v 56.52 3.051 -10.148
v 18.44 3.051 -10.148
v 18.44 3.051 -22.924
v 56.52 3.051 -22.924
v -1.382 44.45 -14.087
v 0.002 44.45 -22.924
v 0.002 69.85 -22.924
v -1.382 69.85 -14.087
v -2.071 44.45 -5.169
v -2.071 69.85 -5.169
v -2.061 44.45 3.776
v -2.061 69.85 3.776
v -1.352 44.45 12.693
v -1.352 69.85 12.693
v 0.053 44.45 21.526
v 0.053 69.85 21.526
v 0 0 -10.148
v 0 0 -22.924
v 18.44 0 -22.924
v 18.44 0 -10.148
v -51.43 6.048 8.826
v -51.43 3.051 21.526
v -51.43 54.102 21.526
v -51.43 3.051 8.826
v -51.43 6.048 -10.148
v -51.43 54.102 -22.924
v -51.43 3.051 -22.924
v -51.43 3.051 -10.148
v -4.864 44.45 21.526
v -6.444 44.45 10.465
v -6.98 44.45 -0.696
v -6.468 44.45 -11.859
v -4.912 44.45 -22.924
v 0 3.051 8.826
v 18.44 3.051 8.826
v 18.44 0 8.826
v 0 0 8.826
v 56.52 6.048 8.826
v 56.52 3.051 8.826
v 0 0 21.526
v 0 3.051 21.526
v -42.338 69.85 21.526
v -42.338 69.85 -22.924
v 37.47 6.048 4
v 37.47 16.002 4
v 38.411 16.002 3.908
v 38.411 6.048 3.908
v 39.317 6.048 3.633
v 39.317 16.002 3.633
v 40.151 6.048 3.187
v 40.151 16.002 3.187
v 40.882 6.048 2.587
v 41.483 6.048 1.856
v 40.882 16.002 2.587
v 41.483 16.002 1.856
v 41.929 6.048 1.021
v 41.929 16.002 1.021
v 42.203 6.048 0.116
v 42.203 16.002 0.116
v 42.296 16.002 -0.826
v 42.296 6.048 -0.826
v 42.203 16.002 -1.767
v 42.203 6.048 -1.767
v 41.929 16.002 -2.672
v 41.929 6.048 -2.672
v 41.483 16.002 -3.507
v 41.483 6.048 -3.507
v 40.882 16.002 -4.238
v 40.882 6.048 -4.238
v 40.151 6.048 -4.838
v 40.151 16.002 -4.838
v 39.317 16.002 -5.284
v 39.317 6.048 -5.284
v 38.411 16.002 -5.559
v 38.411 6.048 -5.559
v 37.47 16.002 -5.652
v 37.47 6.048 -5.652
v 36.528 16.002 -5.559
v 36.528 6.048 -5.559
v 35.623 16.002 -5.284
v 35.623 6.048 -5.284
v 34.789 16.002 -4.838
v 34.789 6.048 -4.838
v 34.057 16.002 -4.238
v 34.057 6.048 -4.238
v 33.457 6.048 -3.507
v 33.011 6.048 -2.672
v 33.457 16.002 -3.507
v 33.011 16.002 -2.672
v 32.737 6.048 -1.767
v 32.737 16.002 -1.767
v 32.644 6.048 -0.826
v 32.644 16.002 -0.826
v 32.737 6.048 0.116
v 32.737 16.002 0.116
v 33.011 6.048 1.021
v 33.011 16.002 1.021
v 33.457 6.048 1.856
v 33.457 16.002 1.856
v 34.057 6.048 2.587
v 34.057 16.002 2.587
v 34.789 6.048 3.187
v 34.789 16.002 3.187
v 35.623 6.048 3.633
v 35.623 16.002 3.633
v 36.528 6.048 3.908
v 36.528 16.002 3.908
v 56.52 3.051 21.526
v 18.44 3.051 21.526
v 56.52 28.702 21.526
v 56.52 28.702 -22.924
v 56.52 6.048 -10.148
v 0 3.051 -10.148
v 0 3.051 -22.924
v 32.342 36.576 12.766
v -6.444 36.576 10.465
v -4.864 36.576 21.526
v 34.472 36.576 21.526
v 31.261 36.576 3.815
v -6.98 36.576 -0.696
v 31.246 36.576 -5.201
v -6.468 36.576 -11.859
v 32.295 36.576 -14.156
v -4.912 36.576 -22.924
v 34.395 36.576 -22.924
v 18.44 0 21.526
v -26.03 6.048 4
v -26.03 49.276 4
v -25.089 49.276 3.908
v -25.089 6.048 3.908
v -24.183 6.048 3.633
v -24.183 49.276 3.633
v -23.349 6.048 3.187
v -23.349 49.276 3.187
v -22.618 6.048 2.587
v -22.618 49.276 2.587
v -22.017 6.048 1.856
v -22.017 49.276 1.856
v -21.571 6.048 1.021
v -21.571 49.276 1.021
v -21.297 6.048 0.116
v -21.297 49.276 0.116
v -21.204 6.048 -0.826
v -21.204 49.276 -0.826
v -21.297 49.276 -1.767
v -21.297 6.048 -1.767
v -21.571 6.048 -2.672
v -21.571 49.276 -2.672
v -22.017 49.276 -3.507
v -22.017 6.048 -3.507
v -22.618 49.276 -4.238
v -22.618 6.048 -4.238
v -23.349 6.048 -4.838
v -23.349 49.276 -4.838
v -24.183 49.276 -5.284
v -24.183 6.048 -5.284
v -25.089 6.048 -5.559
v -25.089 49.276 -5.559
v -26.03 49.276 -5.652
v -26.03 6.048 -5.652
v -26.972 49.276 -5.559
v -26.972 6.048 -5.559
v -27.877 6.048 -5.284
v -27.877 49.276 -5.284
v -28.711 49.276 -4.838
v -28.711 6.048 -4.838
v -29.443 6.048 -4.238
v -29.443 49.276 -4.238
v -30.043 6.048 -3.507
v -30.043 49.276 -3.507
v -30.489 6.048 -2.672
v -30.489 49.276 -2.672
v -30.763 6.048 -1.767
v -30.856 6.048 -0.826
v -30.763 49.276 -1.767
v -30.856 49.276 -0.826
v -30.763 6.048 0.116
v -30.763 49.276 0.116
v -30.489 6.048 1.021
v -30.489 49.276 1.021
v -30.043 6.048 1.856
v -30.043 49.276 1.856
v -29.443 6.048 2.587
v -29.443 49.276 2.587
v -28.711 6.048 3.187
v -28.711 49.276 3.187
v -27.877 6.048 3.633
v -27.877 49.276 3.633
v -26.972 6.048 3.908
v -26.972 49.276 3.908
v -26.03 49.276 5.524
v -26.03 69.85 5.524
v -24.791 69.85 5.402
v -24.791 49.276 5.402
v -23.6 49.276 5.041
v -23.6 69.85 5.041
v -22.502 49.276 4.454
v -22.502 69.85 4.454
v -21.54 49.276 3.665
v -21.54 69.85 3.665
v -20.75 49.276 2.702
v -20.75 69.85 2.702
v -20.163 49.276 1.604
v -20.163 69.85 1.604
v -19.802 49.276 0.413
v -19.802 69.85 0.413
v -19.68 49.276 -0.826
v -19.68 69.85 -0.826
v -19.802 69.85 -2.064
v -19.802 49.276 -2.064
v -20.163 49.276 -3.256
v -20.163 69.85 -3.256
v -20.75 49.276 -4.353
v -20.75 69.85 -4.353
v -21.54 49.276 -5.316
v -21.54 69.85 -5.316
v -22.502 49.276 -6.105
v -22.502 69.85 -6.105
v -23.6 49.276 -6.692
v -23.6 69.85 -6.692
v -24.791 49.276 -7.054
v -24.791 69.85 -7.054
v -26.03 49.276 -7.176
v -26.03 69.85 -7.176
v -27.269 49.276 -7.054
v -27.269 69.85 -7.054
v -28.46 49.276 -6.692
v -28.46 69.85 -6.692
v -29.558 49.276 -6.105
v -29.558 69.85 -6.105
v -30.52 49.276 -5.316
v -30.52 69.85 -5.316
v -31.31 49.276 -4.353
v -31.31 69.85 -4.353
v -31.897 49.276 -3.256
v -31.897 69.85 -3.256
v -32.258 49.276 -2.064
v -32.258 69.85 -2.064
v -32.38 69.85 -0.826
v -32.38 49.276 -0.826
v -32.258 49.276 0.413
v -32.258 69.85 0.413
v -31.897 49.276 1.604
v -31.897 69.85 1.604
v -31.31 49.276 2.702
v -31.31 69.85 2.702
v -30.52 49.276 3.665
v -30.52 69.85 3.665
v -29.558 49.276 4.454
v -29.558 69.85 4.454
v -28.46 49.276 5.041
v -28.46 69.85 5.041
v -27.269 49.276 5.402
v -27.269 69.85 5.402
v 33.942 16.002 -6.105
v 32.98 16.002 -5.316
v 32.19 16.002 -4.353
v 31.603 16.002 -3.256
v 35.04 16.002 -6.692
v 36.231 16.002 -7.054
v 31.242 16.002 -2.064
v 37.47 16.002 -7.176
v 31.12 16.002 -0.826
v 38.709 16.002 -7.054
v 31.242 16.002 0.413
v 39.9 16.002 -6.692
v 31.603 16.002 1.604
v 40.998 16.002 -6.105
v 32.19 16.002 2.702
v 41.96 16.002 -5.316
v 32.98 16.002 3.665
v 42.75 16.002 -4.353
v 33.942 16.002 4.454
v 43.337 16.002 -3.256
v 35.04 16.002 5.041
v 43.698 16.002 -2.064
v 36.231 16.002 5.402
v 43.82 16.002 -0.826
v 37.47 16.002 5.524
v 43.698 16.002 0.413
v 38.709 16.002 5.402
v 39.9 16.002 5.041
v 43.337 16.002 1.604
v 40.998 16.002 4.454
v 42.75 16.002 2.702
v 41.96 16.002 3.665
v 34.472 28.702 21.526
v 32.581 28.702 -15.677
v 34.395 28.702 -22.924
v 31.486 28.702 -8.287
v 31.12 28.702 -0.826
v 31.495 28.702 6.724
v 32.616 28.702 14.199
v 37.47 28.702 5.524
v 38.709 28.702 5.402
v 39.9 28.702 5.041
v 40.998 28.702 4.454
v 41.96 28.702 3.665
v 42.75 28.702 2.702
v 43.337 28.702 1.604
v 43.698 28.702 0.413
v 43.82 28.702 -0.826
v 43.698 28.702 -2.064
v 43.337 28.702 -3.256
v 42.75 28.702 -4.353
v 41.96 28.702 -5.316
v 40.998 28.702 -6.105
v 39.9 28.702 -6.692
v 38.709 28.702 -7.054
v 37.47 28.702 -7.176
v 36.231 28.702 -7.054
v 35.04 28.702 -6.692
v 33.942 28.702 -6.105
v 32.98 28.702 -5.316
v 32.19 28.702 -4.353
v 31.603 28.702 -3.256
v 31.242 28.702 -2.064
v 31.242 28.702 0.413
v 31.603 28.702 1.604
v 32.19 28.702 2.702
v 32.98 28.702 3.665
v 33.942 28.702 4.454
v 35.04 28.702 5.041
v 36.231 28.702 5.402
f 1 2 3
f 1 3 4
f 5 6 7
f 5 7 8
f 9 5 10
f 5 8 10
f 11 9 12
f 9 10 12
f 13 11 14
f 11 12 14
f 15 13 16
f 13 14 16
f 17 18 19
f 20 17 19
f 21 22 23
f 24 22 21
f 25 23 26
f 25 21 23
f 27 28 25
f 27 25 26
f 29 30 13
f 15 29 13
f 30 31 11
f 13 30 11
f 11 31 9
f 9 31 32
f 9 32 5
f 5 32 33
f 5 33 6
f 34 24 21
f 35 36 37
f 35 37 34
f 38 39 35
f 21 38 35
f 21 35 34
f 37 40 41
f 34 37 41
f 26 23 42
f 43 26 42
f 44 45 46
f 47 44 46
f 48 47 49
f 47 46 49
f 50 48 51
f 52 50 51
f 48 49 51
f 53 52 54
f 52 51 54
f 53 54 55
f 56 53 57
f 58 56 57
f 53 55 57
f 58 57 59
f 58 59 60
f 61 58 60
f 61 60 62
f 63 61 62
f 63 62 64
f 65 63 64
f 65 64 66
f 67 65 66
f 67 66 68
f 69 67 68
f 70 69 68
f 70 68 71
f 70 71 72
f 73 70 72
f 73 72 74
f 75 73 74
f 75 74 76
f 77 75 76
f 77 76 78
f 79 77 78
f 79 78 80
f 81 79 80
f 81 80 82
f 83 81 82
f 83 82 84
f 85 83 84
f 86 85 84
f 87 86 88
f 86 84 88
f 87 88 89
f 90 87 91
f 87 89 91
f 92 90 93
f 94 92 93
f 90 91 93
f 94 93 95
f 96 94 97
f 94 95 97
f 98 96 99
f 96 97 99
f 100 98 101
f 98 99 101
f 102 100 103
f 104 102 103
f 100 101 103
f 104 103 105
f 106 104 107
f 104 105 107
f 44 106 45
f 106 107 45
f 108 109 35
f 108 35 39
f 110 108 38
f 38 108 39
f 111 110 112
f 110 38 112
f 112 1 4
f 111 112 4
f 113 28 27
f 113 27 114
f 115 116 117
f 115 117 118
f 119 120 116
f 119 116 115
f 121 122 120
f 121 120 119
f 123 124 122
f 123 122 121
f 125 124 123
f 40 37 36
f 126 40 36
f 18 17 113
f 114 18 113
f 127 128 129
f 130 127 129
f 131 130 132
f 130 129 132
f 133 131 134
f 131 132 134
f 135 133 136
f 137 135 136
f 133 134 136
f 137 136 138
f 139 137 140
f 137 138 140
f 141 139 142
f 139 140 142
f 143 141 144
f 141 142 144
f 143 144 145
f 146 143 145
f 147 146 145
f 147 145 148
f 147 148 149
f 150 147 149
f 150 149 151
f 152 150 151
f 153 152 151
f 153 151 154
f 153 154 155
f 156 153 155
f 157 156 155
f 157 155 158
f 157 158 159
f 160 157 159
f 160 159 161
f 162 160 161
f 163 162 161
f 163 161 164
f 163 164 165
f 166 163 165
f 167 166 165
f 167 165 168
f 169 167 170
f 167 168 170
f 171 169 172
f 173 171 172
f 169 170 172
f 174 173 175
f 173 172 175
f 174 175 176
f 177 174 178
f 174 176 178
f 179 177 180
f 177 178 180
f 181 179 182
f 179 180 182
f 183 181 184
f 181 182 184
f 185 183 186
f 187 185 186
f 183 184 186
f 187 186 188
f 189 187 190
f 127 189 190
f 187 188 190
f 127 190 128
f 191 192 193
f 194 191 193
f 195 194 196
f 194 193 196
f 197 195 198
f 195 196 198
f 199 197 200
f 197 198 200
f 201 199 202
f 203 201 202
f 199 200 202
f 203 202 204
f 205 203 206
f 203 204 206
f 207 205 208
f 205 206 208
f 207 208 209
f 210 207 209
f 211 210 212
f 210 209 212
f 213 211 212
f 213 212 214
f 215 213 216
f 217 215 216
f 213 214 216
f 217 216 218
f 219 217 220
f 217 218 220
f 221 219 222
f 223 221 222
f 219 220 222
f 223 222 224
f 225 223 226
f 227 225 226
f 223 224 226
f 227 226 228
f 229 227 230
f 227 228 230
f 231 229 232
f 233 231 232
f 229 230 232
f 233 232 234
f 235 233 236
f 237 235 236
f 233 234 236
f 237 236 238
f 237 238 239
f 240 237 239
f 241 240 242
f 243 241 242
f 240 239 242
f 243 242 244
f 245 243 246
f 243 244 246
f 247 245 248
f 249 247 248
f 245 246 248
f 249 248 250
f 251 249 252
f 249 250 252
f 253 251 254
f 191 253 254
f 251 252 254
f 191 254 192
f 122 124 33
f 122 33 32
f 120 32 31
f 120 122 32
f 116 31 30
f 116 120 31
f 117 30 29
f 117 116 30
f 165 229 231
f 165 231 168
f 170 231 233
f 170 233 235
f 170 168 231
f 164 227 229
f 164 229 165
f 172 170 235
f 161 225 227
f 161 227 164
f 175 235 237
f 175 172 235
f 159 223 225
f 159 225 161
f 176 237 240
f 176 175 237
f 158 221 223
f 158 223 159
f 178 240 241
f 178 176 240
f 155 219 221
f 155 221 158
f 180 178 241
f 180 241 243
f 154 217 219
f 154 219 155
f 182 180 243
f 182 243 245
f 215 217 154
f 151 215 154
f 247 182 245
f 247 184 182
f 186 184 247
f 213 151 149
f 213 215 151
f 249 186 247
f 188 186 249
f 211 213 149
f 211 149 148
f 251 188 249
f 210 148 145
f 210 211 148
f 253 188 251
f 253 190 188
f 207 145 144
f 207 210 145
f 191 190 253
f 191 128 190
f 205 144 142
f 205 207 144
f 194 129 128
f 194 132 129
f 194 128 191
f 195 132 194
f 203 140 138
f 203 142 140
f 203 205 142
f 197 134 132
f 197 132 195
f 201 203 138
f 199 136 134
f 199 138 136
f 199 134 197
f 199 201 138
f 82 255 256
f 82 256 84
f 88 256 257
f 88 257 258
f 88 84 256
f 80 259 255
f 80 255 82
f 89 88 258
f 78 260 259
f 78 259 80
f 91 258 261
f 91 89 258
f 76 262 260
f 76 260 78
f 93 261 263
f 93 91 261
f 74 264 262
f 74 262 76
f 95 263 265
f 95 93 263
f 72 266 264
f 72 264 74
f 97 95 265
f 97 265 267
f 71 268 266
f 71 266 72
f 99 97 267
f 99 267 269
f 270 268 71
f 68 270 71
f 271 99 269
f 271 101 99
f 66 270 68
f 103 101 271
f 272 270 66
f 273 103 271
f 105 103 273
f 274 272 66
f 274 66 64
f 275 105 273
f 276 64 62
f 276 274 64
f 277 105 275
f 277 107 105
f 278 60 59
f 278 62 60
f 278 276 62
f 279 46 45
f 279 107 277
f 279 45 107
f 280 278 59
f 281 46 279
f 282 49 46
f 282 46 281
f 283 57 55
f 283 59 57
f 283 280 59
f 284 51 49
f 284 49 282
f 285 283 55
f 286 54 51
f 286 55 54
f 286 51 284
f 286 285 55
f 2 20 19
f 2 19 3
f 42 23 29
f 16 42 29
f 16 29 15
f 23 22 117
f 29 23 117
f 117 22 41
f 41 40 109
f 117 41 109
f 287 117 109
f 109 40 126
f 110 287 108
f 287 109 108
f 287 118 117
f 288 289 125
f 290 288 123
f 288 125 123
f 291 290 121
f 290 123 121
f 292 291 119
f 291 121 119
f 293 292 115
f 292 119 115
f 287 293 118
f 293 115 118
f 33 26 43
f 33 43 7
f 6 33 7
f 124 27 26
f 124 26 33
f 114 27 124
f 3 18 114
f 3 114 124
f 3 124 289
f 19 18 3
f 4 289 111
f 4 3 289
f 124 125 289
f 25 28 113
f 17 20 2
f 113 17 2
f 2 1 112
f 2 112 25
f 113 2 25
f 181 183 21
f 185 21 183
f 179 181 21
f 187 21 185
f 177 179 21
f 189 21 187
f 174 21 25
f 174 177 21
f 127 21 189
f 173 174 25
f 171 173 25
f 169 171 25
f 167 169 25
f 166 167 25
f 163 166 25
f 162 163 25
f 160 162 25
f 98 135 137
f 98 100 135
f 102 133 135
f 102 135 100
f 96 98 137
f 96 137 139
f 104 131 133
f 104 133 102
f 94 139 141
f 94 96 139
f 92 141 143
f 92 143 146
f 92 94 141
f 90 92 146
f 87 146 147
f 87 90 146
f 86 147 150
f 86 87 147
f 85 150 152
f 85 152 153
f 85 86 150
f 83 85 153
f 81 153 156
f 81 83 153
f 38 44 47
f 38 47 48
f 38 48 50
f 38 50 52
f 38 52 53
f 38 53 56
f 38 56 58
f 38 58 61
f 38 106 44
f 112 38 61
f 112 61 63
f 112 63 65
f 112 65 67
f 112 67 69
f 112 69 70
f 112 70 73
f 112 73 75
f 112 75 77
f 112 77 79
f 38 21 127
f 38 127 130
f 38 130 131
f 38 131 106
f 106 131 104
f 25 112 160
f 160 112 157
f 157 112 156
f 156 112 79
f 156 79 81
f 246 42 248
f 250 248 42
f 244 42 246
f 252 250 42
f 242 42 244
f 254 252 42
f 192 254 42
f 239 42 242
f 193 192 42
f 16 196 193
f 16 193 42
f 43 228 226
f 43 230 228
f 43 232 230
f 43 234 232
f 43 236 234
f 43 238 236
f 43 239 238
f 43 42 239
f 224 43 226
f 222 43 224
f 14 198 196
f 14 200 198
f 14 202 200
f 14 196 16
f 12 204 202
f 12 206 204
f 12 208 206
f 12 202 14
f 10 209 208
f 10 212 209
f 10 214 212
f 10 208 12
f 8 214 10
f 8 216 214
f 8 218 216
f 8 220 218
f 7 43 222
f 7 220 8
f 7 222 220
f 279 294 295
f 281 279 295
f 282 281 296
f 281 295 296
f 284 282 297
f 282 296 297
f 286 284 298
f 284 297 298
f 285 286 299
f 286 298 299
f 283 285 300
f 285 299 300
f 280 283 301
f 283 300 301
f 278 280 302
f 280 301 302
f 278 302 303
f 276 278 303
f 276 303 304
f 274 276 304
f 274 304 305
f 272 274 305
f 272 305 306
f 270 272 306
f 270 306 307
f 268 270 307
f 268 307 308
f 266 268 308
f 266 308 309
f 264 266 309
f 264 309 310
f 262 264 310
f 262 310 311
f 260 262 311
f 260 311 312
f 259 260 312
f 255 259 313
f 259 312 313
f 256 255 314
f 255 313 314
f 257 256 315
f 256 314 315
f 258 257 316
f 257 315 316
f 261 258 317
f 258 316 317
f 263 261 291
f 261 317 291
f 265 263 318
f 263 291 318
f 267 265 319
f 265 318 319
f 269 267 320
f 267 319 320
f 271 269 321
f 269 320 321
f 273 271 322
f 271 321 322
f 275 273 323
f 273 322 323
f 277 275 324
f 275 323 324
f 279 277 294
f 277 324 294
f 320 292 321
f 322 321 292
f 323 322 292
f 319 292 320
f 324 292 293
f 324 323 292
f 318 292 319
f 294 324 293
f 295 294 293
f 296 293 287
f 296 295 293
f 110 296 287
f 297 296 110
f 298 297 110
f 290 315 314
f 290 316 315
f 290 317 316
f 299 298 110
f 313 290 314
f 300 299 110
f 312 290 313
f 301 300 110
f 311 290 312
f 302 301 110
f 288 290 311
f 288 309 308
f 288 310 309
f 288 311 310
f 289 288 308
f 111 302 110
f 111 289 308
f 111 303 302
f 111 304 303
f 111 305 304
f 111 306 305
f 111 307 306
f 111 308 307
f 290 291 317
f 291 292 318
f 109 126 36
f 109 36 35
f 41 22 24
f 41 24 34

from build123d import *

# Parameters (mm, degrees)
SKETCH1_W           = 107.95
SKETCH1_H           = 44.45
BOSS_EXTRUDE1_DEPTH = 69.85
SKETCH2_W           = 18.973953495
SKETCH2_H           = 6.048241647
CUT_EXTRUDE1_DEPTH  = 141.986
SKETCH3_W           = 38.080163228
SKETCH3_H           = 3.050825249
SKETCH3_W_2         = 51.430009823
CUT_EXTRUDE3_DEPTH  = 141.986
CUT_EXTRUDE4_DEPTH  = 141.986
SKETCH8_R           = 114.3
CUT_EXTRUDE6_DEPTH  = 33.274
SKETCH12_R          = 119.126
CUT_EXTRUDE7_DEPTH  = 7.874
SKETCH13_R          = 6.35
CUT_EXTRUDE8_DEPTH  = 20.574
SKETCH14_R          = 76.2
CUT_EXTRUDE9_DEPTH  = 7.874
SKETCH15_R          = 6.35
CUT_EXTRUDE10_DEPTH = 20.574
SKETCH16_R          = 4.826
CUT_EXTRUDE11_DEPTH = 81.28


with BuildPart() as part:
    # Sketch1 → Boss-Extrude1 (new body)
    with BuildSketch(Plane(origin=(0, 0, 0), x_dir=(1, 0, 0), z_dir=(0, 1, 0))):
        with Locations((2.544990177, 0.698624754)):
            Rectangle(SKETCH1_W, SKETCH1_H)
    extrude(amount=BOSS_EXTRUDE1_DEPTH)

    # Sketch2 → Cut-Extrude1 (cut)
    with BuildSketch(Plane(origin=(56.519990177, 0, 0), x_dir=(0, 0, -1), z_dir=(1, 0, 0))):
        with Locations((0.660601501, 3.024120824)):
            Rectangle(SKETCH2_W, SKETCH2_H)
    extrude(amount=-CUT_EXTRUDE1_DEPTH, mode=Mode.SUBTRACT)

    # Sketch3 → Cut-Extrude3 (cut)
    with BuildSketch(Plane.XY.offset(21.526375246)):
        with Locations((37.479908563, 1.525412625)):
            Rectangle(SKETCH3_W, SKETCH3_H)
        with Locations((-25.715004912, 1.525412625)):
            Rectangle(SKETCH3_W_2, SKETCH3_H)
    extrude(amount=-CUT_EXTRUDE3_DEPTH, mode=Mode.SUBTRACT)

    # Sketch7 → Cut-Extrude4 (cut)
    with BuildSketch(Plane.XY.offset(21.526375246)):
        Polygon((-51.430009823, 54.102), (-42.337897784, 69.85), (-51.430009823, 69.85), align=None)
    extrude(amount=-CUT_EXTRUDE4_DEPTH, mode=Mode.SUBTRACT)

    # Sketch8 → Cut-Extrude6 (cut)
    with BuildSketch(Plane(origin=(0, 69.85, 0), x_dir=(1, 0, 0), z_dir=(0, 1, 0))):
        with Locations((112.145990177, 0.825624754)):
            Circle(SKETCH8_R)
    extrude(amount=-CUT_EXTRUDE6_DEPTH, mode=Mode.SUBTRACT)

    # Sketch12 → Cut-Extrude7 (cut)
    with BuildSketch(Plane(origin=(0, 36.576, 0), x_dir=(1, 0, 0), z_dir=(0, 1, 0))):
        with Locations((112.145990177, 0.825624754)):
            Circle(SKETCH12_R)
    extrude(amount=CUT_EXTRUDE7_DEPTH, mode=Mode.SUBTRACT)

    # Sketch13 → Cut-Extrude8 (cut)
    with BuildSketch(Plane(origin=(0, 36.576, 0), x_dir=(1, 0, 0), z_dir=(0, 1, 0))):
        with Locations(Location((37.469990177, 0.825624754, 0), (0, 0, 270))):
            Circle(SKETCH13_R)
    extrude(amount=-CUT_EXTRUDE8_DEPTH, mode=Mode.SUBTRACT)

    # Sketch14 → Cut-Extrude9 (cut)
    with BuildSketch(Plane(origin=(0, 36.576, 0), x_dir=(1, 0, 0), z_dir=(0, 1, 0))):
        with Locations((107.319990177, 0.825624754)):
            Circle(SKETCH14_R)
    extrude(amount=-CUT_EXTRUDE9_DEPTH, mode=Mode.SUBTRACT)

    # Sketch15 → Cut-Extrude10 (cut)
    with BuildSketch(Plane(origin=(0, 69.85, 0), x_dir=(1, 0, 0), z_dir=(0, 1, 0))):
        with Locations(Location((-26.030009823, 0.825624754, 0), (0, 0, 270))):
            Circle(SKETCH15_R)
    extrude(amount=-CUT_EXTRUDE10_DEPTH, mode=Mode.SUBTRACT)

    # Sketch16 → Cut-Extrude11 (cut)
    with BuildSketch(Plane(origin=(0, 69.85, 0), x_dir=(1, 0, 0), z_dir=(0, 1, 0))):
        with Locations(Location((-26.030009823, 0.825624754, 0), (0, 0, 270))):
            Circle(SKETCH16_R)
        with Locations(Location((37.469990177, 0.825624754, 0), (0, 0, 270))):
            Circle(SKETCH16_R)
    extrude(amount=-CUT_EXTRUDE11_DEPTH, mode=Mode.SUBTRACT)


solid = part.part
